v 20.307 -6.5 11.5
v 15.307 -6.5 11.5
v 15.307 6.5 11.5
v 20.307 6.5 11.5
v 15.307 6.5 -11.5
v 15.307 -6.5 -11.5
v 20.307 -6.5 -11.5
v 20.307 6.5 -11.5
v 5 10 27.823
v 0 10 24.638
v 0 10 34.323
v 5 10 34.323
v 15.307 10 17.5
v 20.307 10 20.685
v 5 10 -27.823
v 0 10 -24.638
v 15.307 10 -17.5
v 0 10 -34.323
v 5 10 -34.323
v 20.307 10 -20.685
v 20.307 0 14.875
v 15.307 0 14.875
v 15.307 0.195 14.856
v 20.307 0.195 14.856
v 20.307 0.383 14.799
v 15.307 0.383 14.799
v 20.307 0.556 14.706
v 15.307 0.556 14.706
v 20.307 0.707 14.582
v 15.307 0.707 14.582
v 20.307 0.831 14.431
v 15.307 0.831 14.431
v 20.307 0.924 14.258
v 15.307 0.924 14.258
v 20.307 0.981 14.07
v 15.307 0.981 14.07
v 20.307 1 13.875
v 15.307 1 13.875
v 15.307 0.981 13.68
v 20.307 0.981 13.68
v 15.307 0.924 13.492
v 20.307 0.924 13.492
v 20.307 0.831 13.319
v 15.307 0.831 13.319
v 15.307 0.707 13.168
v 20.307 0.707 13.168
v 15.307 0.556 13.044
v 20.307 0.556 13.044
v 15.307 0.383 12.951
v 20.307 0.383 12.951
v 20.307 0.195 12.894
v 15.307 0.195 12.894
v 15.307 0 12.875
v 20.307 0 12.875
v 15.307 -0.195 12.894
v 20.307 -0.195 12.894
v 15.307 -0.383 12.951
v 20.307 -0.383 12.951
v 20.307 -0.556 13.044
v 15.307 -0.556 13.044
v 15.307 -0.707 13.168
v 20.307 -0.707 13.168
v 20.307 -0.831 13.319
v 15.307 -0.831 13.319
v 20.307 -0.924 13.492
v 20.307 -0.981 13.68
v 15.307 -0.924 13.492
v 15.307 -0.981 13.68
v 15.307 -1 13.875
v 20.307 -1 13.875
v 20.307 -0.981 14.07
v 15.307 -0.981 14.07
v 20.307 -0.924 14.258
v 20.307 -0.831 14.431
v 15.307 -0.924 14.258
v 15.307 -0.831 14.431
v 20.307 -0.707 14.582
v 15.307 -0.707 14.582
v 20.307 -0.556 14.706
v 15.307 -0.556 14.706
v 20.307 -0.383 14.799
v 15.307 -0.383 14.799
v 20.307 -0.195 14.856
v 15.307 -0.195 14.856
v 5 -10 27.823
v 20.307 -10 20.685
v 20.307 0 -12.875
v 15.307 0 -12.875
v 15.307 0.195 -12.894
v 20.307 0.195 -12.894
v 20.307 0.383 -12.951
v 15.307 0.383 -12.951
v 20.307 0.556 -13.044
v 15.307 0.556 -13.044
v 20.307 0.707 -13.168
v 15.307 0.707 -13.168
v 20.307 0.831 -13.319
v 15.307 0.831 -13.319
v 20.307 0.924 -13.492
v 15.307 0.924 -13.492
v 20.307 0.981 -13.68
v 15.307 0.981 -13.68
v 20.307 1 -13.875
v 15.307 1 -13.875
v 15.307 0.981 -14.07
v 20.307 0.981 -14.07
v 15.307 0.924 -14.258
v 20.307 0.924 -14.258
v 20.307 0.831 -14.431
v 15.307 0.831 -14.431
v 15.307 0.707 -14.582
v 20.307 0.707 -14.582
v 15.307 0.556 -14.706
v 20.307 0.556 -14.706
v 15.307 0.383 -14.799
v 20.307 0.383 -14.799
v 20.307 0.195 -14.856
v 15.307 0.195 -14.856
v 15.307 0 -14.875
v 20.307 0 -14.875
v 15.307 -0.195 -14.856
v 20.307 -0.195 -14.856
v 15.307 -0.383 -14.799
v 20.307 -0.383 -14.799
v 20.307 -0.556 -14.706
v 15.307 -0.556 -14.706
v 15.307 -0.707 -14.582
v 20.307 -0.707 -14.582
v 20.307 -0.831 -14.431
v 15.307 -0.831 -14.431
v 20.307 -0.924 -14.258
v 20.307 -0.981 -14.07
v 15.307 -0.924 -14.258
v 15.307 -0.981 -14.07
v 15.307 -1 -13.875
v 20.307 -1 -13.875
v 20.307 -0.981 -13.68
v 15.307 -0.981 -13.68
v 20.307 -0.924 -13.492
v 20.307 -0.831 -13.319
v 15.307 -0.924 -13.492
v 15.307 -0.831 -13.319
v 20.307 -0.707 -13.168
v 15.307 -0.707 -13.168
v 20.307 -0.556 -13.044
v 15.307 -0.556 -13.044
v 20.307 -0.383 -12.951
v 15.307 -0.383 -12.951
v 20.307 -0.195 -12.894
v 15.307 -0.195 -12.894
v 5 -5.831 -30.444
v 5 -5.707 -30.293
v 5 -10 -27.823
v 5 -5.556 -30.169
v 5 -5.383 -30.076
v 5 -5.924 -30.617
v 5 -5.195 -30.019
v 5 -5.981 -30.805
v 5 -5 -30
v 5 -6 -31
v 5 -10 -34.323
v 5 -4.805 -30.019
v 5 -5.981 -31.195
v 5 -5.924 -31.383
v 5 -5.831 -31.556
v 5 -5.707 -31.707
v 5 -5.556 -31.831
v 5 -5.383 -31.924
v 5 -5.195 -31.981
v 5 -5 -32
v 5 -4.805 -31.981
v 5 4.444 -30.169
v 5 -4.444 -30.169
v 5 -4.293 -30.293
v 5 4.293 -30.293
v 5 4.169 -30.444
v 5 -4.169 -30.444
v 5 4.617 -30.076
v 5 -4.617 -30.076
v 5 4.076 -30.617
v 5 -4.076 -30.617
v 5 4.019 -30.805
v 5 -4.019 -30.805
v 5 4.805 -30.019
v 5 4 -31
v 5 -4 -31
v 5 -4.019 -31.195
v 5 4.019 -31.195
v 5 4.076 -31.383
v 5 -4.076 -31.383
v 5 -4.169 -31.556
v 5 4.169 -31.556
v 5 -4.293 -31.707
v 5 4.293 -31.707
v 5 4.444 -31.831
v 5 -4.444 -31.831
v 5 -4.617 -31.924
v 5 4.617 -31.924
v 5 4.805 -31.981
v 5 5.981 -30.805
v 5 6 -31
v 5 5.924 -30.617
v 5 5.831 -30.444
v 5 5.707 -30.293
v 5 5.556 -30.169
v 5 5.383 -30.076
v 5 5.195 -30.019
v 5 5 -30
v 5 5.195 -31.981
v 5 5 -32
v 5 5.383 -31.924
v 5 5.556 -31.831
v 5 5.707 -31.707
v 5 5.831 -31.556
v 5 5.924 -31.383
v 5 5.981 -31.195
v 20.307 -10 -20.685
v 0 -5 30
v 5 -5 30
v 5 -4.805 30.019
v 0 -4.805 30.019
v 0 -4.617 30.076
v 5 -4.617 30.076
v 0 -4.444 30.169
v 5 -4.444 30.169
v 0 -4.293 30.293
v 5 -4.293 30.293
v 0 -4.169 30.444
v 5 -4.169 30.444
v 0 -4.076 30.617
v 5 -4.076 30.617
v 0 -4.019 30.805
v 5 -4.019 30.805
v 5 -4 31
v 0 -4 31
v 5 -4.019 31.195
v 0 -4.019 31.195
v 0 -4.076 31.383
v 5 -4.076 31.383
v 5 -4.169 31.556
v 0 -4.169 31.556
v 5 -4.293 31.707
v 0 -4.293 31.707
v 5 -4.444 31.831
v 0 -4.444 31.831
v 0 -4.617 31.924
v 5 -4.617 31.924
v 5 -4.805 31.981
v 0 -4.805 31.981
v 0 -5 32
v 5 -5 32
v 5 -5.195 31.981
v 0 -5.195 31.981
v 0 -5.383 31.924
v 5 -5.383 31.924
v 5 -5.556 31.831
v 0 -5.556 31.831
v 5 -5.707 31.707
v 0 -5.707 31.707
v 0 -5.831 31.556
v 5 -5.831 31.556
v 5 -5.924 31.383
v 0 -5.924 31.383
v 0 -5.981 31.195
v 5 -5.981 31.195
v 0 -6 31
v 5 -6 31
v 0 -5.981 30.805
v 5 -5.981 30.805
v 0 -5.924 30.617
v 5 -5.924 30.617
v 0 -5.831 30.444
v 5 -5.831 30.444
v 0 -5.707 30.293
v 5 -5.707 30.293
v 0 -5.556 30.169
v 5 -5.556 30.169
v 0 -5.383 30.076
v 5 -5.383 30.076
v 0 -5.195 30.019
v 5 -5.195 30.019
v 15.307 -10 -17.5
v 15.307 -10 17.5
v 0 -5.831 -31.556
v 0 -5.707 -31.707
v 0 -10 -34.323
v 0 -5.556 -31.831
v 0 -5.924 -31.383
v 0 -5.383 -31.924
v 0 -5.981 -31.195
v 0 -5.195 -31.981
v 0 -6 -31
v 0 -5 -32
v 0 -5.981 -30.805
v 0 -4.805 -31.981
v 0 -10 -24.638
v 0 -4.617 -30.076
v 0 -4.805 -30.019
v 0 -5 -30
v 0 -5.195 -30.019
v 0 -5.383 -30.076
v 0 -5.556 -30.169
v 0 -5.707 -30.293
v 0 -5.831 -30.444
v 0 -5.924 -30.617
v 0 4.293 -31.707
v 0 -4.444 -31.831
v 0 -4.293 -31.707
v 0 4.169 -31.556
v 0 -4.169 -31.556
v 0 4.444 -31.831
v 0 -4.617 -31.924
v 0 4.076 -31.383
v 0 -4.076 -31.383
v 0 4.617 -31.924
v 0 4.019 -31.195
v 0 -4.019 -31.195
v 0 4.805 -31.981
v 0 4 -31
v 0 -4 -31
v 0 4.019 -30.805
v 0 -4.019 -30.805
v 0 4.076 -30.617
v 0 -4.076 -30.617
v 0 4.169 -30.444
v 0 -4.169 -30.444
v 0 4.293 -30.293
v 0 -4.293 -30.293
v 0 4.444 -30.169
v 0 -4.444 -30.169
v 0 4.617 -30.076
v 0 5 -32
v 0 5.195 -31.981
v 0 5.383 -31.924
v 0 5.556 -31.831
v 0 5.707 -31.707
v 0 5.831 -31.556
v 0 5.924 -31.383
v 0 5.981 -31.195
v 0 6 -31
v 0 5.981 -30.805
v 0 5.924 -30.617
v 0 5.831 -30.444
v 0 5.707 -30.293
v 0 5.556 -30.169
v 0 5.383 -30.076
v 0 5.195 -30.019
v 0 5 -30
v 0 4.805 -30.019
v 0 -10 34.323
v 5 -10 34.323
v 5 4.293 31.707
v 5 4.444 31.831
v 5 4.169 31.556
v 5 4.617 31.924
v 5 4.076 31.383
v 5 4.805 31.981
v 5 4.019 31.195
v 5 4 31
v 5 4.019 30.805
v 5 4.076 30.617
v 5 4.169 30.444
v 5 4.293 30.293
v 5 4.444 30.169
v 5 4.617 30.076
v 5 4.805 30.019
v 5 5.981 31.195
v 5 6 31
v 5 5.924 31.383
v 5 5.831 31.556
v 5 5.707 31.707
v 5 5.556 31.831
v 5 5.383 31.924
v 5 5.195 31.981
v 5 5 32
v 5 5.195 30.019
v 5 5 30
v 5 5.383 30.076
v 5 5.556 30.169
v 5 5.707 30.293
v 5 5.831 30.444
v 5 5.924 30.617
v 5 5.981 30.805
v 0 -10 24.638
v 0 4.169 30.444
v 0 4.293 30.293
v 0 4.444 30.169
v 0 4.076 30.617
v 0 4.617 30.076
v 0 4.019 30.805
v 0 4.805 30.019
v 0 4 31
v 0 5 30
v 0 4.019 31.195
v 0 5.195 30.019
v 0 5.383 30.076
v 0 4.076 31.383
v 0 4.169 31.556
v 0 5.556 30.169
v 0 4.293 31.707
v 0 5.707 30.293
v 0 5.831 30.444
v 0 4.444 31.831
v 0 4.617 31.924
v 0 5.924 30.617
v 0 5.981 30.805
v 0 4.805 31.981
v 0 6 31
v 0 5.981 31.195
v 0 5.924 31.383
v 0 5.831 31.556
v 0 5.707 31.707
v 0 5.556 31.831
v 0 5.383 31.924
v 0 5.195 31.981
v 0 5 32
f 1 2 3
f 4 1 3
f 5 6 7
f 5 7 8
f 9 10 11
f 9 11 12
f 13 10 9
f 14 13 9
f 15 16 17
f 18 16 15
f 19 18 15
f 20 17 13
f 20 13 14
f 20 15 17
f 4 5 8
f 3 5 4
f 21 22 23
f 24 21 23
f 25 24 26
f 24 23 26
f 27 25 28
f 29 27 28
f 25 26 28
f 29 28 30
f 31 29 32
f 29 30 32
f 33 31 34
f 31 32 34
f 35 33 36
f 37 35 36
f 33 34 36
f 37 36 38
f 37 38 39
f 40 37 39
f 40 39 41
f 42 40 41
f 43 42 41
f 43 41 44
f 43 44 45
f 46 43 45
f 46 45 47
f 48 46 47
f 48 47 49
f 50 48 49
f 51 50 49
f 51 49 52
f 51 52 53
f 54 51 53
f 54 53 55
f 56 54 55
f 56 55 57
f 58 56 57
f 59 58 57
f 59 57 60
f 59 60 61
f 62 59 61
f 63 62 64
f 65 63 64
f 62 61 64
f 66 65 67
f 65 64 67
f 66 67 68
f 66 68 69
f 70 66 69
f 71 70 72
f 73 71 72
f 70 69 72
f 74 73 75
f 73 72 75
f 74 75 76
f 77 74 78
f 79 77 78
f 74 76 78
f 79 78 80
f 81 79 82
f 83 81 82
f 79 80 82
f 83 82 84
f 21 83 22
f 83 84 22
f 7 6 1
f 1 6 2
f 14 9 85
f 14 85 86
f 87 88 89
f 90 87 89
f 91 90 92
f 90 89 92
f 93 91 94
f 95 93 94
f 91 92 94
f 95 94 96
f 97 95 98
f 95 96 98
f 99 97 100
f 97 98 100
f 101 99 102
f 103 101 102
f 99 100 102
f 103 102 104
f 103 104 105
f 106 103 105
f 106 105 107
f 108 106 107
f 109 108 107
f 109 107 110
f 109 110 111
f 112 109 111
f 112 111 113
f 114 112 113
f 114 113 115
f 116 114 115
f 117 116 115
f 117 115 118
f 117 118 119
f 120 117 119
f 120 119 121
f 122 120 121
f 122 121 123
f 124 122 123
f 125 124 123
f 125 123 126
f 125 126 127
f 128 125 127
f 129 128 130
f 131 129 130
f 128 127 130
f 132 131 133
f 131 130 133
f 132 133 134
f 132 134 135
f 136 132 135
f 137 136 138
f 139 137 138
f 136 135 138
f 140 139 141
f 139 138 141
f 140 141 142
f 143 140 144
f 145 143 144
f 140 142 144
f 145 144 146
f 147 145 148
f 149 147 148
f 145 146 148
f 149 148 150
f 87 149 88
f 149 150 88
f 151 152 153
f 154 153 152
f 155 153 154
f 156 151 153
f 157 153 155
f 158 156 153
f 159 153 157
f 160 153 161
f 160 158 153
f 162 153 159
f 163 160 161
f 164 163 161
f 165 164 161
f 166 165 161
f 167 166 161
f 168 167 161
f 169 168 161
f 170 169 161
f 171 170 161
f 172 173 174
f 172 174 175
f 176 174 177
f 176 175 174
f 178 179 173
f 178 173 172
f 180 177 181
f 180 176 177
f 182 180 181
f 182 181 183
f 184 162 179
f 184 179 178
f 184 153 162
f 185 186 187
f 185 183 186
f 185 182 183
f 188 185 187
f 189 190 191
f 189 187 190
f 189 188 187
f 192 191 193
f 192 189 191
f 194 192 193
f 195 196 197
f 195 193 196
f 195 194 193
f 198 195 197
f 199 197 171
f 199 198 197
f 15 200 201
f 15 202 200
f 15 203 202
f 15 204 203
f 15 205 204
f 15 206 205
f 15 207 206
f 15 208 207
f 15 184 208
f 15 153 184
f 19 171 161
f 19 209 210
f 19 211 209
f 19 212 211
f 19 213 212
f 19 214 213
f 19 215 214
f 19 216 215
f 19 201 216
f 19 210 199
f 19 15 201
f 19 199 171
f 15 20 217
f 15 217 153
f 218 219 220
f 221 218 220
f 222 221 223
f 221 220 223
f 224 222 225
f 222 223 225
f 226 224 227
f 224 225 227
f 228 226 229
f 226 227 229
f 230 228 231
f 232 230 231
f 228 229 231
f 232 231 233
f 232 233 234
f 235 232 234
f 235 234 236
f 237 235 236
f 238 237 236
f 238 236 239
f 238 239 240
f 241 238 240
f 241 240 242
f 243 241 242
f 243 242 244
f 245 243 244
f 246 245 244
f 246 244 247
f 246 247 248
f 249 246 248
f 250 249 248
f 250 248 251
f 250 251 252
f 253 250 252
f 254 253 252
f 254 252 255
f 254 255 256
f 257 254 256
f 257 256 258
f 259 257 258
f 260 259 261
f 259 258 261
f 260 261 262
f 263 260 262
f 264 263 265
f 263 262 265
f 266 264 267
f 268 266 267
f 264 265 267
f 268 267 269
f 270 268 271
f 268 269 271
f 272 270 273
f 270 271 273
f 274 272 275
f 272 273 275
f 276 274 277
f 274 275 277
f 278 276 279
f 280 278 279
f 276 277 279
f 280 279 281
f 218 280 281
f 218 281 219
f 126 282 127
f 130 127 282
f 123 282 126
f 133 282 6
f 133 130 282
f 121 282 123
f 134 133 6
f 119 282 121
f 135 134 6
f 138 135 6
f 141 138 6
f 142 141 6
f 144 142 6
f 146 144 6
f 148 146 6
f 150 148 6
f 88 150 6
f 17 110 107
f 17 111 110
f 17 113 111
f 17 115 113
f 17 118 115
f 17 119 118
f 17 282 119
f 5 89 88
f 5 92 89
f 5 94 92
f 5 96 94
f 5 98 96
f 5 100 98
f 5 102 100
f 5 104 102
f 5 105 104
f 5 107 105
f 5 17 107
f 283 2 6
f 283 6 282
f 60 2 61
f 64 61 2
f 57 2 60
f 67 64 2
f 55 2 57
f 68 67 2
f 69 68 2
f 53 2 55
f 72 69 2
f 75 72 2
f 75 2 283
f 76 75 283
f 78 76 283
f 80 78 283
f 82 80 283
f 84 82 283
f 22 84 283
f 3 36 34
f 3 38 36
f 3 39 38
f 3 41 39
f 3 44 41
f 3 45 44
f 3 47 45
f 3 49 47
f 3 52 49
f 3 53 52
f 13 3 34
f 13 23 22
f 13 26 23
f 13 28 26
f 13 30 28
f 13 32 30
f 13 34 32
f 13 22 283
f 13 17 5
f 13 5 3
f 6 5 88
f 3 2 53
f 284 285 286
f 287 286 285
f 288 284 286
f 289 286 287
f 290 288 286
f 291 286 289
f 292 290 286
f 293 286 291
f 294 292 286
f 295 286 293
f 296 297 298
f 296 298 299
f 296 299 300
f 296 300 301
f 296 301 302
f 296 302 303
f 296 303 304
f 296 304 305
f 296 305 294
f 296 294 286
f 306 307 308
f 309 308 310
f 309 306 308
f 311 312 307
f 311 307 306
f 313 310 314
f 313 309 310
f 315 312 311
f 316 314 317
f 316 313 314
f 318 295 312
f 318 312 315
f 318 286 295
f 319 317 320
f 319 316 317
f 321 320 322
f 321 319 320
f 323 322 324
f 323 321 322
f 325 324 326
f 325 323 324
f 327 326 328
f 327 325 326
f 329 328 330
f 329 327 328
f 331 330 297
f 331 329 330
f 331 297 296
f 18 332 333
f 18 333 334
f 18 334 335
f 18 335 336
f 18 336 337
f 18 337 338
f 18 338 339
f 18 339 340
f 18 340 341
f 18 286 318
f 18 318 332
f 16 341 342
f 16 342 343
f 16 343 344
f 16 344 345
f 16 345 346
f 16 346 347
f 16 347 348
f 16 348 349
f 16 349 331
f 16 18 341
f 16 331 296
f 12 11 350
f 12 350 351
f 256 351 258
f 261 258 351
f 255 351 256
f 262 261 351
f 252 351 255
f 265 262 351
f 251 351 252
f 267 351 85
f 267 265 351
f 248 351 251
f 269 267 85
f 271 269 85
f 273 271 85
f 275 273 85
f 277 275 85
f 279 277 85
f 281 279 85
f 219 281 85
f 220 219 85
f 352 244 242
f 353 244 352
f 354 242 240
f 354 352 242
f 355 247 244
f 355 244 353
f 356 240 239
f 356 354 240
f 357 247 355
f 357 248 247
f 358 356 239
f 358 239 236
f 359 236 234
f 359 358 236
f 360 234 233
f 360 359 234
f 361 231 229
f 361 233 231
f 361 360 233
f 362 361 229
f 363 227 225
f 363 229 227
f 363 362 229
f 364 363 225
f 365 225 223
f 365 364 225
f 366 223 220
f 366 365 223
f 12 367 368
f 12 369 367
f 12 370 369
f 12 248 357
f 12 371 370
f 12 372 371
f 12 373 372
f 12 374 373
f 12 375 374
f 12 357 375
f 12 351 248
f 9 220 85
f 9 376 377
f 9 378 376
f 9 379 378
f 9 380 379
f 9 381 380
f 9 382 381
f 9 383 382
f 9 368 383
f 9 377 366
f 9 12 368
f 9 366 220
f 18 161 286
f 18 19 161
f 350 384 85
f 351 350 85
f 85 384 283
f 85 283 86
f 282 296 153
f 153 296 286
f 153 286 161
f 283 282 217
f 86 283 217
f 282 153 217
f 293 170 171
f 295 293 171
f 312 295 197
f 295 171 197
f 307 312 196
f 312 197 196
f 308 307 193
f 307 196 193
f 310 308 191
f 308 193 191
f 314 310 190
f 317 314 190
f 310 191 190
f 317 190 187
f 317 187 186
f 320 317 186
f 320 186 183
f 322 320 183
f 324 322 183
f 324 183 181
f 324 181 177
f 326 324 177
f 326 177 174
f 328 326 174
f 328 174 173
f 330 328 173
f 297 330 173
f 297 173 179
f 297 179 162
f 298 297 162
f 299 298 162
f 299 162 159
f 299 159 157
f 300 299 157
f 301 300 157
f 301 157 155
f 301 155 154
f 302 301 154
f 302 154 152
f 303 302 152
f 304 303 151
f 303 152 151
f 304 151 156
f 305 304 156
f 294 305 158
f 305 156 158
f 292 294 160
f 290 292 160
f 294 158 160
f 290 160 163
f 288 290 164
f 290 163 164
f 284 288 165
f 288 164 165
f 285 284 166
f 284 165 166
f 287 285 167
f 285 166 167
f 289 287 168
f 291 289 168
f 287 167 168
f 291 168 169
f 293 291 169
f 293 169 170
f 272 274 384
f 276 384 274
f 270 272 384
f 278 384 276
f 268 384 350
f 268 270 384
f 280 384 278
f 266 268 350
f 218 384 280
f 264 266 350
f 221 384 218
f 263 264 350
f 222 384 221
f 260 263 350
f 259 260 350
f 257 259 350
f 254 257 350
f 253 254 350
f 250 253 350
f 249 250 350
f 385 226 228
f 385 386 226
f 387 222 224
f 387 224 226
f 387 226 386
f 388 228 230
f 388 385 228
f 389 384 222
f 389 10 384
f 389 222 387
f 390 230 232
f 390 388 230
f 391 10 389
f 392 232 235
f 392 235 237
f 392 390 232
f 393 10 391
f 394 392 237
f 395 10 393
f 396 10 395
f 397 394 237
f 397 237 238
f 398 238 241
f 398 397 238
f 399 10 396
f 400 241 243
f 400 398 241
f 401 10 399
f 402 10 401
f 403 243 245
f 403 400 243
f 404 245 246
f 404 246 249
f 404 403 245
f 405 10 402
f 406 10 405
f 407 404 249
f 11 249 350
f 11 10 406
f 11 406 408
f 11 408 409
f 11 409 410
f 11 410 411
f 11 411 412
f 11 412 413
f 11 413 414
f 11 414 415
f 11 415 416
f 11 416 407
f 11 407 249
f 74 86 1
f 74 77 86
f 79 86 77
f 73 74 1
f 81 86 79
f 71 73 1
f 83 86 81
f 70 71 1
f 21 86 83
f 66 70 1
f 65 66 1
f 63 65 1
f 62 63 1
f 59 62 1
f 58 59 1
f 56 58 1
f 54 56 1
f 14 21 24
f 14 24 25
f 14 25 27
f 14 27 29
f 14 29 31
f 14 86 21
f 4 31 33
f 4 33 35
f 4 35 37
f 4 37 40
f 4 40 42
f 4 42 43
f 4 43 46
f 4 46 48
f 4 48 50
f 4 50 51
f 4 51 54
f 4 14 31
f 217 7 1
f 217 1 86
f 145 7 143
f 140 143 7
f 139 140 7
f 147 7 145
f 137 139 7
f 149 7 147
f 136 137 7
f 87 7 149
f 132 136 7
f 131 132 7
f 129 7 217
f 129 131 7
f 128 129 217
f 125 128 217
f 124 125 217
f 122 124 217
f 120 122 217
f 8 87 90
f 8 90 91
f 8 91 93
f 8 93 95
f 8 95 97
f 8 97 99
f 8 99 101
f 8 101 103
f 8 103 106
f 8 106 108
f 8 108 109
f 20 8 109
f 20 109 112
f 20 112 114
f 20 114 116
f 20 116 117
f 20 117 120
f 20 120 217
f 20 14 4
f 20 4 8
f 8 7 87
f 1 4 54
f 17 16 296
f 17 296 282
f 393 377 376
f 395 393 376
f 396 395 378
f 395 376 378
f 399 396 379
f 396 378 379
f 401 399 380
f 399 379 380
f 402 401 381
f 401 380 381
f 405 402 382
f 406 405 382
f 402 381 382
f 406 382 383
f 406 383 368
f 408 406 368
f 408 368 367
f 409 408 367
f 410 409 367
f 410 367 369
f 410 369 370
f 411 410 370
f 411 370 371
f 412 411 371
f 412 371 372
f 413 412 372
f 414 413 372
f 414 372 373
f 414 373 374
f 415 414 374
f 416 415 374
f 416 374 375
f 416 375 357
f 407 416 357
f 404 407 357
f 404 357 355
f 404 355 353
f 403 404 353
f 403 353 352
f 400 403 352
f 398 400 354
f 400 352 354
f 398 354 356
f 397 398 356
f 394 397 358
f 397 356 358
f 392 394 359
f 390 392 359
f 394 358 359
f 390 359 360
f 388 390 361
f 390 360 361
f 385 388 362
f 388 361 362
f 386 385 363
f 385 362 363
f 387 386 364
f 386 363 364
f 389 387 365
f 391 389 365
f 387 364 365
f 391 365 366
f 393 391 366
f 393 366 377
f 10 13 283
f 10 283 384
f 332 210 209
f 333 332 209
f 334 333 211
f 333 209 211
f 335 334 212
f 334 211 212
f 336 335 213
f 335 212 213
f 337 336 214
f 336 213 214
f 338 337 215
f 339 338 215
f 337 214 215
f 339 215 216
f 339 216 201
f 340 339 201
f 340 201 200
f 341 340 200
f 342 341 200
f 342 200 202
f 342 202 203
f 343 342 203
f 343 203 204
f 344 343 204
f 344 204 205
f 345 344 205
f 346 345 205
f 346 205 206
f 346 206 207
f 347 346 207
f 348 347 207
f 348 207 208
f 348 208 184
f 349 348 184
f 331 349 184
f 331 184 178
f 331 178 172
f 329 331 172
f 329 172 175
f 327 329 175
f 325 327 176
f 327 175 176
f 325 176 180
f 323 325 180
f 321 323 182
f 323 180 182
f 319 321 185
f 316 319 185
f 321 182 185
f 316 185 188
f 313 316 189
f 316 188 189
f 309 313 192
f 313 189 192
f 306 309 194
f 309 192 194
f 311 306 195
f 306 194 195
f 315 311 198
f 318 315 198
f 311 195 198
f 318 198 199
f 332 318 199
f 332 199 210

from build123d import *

# Parameters (mm, degrees)
BOSS_EXTRUDE1_DEPTH      = 10
BOSS_EXTRUDE1_DEPTH_BACK = 10
SKETCH3_R                = 1
SKETCH3_W                = 23
SKETCH3_H                = 13
CUT_EXTRUDE1_DEPTH       = 39.889503993
SKETCH5_R                = 1
CUT_EXTRUDE2_DEPTH       = 39.889503993


with BuildPart() as part:
    # Sketch1 → Boss-Extrude1 (new, two sides: drawn at the far end of the back side and taken through both)
    with BuildSketch(Plane(origin=(0, 0, 0), x_dir=(1, 0, 0), z_dir=(0, 1, 0)).offset(-BOSS_EXTRUDE1_DEPTH_BACK)):
        Polygon((0, 34.323215889), (0, 24.637864585), (15.3072, 17.5), (15.3072, -17.5), (0, -24.637864585), (0, -34.323215889), (5, -34.323215889), (5, -27.823215889), (20.3072, -20.685351304), (20.3072, 20.685351304), (5, 27.823215889), (5, 34.323215889), align=None)
    extrude(amount=BOSS_EXTRUDE1_DEPTH + BOSS_EXTRUDE1_DEPTH_BACK)

    # Sketch3 → Cut-Extrude1 (cut, through all)
    with BuildSketch(Plane.ZY.offset(-15.3072)):
        with Locations((-13.875, 0)):
            Circle(SKETCH3_R)
        with Locations((13.875, 0)):
            Circle(SKETCH3_R)
        Rectangle(SKETCH3_W, SKETCH3_H)
    extrude(amount=-CUT_EXTRUDE1_DEPTH, mode=Mode.SUBTRACT)

    # Sketch5 → Cut-Extrude2 (cut, through all)
    with BuildSketch(Plane(origin=(5, 0, 0), x_dir=(0, 0, -1), z_dir=(1, 0, 0))):
        with Locations((31, -5)):
            Circle(SKETCH5_R)
        with Locations((31, 5)):
            Circle(SKETCH5_R)
        with Locations((-31, 5)):
            Circle(SKETCH5_R)
        with Locations((-31, -5)):
            Circle(SKETCH5_R)
    extrude(amount=-CUT_EXTRUDE2_DEPTH, mode=Mode.SUBTRACT)


solid = part.part
